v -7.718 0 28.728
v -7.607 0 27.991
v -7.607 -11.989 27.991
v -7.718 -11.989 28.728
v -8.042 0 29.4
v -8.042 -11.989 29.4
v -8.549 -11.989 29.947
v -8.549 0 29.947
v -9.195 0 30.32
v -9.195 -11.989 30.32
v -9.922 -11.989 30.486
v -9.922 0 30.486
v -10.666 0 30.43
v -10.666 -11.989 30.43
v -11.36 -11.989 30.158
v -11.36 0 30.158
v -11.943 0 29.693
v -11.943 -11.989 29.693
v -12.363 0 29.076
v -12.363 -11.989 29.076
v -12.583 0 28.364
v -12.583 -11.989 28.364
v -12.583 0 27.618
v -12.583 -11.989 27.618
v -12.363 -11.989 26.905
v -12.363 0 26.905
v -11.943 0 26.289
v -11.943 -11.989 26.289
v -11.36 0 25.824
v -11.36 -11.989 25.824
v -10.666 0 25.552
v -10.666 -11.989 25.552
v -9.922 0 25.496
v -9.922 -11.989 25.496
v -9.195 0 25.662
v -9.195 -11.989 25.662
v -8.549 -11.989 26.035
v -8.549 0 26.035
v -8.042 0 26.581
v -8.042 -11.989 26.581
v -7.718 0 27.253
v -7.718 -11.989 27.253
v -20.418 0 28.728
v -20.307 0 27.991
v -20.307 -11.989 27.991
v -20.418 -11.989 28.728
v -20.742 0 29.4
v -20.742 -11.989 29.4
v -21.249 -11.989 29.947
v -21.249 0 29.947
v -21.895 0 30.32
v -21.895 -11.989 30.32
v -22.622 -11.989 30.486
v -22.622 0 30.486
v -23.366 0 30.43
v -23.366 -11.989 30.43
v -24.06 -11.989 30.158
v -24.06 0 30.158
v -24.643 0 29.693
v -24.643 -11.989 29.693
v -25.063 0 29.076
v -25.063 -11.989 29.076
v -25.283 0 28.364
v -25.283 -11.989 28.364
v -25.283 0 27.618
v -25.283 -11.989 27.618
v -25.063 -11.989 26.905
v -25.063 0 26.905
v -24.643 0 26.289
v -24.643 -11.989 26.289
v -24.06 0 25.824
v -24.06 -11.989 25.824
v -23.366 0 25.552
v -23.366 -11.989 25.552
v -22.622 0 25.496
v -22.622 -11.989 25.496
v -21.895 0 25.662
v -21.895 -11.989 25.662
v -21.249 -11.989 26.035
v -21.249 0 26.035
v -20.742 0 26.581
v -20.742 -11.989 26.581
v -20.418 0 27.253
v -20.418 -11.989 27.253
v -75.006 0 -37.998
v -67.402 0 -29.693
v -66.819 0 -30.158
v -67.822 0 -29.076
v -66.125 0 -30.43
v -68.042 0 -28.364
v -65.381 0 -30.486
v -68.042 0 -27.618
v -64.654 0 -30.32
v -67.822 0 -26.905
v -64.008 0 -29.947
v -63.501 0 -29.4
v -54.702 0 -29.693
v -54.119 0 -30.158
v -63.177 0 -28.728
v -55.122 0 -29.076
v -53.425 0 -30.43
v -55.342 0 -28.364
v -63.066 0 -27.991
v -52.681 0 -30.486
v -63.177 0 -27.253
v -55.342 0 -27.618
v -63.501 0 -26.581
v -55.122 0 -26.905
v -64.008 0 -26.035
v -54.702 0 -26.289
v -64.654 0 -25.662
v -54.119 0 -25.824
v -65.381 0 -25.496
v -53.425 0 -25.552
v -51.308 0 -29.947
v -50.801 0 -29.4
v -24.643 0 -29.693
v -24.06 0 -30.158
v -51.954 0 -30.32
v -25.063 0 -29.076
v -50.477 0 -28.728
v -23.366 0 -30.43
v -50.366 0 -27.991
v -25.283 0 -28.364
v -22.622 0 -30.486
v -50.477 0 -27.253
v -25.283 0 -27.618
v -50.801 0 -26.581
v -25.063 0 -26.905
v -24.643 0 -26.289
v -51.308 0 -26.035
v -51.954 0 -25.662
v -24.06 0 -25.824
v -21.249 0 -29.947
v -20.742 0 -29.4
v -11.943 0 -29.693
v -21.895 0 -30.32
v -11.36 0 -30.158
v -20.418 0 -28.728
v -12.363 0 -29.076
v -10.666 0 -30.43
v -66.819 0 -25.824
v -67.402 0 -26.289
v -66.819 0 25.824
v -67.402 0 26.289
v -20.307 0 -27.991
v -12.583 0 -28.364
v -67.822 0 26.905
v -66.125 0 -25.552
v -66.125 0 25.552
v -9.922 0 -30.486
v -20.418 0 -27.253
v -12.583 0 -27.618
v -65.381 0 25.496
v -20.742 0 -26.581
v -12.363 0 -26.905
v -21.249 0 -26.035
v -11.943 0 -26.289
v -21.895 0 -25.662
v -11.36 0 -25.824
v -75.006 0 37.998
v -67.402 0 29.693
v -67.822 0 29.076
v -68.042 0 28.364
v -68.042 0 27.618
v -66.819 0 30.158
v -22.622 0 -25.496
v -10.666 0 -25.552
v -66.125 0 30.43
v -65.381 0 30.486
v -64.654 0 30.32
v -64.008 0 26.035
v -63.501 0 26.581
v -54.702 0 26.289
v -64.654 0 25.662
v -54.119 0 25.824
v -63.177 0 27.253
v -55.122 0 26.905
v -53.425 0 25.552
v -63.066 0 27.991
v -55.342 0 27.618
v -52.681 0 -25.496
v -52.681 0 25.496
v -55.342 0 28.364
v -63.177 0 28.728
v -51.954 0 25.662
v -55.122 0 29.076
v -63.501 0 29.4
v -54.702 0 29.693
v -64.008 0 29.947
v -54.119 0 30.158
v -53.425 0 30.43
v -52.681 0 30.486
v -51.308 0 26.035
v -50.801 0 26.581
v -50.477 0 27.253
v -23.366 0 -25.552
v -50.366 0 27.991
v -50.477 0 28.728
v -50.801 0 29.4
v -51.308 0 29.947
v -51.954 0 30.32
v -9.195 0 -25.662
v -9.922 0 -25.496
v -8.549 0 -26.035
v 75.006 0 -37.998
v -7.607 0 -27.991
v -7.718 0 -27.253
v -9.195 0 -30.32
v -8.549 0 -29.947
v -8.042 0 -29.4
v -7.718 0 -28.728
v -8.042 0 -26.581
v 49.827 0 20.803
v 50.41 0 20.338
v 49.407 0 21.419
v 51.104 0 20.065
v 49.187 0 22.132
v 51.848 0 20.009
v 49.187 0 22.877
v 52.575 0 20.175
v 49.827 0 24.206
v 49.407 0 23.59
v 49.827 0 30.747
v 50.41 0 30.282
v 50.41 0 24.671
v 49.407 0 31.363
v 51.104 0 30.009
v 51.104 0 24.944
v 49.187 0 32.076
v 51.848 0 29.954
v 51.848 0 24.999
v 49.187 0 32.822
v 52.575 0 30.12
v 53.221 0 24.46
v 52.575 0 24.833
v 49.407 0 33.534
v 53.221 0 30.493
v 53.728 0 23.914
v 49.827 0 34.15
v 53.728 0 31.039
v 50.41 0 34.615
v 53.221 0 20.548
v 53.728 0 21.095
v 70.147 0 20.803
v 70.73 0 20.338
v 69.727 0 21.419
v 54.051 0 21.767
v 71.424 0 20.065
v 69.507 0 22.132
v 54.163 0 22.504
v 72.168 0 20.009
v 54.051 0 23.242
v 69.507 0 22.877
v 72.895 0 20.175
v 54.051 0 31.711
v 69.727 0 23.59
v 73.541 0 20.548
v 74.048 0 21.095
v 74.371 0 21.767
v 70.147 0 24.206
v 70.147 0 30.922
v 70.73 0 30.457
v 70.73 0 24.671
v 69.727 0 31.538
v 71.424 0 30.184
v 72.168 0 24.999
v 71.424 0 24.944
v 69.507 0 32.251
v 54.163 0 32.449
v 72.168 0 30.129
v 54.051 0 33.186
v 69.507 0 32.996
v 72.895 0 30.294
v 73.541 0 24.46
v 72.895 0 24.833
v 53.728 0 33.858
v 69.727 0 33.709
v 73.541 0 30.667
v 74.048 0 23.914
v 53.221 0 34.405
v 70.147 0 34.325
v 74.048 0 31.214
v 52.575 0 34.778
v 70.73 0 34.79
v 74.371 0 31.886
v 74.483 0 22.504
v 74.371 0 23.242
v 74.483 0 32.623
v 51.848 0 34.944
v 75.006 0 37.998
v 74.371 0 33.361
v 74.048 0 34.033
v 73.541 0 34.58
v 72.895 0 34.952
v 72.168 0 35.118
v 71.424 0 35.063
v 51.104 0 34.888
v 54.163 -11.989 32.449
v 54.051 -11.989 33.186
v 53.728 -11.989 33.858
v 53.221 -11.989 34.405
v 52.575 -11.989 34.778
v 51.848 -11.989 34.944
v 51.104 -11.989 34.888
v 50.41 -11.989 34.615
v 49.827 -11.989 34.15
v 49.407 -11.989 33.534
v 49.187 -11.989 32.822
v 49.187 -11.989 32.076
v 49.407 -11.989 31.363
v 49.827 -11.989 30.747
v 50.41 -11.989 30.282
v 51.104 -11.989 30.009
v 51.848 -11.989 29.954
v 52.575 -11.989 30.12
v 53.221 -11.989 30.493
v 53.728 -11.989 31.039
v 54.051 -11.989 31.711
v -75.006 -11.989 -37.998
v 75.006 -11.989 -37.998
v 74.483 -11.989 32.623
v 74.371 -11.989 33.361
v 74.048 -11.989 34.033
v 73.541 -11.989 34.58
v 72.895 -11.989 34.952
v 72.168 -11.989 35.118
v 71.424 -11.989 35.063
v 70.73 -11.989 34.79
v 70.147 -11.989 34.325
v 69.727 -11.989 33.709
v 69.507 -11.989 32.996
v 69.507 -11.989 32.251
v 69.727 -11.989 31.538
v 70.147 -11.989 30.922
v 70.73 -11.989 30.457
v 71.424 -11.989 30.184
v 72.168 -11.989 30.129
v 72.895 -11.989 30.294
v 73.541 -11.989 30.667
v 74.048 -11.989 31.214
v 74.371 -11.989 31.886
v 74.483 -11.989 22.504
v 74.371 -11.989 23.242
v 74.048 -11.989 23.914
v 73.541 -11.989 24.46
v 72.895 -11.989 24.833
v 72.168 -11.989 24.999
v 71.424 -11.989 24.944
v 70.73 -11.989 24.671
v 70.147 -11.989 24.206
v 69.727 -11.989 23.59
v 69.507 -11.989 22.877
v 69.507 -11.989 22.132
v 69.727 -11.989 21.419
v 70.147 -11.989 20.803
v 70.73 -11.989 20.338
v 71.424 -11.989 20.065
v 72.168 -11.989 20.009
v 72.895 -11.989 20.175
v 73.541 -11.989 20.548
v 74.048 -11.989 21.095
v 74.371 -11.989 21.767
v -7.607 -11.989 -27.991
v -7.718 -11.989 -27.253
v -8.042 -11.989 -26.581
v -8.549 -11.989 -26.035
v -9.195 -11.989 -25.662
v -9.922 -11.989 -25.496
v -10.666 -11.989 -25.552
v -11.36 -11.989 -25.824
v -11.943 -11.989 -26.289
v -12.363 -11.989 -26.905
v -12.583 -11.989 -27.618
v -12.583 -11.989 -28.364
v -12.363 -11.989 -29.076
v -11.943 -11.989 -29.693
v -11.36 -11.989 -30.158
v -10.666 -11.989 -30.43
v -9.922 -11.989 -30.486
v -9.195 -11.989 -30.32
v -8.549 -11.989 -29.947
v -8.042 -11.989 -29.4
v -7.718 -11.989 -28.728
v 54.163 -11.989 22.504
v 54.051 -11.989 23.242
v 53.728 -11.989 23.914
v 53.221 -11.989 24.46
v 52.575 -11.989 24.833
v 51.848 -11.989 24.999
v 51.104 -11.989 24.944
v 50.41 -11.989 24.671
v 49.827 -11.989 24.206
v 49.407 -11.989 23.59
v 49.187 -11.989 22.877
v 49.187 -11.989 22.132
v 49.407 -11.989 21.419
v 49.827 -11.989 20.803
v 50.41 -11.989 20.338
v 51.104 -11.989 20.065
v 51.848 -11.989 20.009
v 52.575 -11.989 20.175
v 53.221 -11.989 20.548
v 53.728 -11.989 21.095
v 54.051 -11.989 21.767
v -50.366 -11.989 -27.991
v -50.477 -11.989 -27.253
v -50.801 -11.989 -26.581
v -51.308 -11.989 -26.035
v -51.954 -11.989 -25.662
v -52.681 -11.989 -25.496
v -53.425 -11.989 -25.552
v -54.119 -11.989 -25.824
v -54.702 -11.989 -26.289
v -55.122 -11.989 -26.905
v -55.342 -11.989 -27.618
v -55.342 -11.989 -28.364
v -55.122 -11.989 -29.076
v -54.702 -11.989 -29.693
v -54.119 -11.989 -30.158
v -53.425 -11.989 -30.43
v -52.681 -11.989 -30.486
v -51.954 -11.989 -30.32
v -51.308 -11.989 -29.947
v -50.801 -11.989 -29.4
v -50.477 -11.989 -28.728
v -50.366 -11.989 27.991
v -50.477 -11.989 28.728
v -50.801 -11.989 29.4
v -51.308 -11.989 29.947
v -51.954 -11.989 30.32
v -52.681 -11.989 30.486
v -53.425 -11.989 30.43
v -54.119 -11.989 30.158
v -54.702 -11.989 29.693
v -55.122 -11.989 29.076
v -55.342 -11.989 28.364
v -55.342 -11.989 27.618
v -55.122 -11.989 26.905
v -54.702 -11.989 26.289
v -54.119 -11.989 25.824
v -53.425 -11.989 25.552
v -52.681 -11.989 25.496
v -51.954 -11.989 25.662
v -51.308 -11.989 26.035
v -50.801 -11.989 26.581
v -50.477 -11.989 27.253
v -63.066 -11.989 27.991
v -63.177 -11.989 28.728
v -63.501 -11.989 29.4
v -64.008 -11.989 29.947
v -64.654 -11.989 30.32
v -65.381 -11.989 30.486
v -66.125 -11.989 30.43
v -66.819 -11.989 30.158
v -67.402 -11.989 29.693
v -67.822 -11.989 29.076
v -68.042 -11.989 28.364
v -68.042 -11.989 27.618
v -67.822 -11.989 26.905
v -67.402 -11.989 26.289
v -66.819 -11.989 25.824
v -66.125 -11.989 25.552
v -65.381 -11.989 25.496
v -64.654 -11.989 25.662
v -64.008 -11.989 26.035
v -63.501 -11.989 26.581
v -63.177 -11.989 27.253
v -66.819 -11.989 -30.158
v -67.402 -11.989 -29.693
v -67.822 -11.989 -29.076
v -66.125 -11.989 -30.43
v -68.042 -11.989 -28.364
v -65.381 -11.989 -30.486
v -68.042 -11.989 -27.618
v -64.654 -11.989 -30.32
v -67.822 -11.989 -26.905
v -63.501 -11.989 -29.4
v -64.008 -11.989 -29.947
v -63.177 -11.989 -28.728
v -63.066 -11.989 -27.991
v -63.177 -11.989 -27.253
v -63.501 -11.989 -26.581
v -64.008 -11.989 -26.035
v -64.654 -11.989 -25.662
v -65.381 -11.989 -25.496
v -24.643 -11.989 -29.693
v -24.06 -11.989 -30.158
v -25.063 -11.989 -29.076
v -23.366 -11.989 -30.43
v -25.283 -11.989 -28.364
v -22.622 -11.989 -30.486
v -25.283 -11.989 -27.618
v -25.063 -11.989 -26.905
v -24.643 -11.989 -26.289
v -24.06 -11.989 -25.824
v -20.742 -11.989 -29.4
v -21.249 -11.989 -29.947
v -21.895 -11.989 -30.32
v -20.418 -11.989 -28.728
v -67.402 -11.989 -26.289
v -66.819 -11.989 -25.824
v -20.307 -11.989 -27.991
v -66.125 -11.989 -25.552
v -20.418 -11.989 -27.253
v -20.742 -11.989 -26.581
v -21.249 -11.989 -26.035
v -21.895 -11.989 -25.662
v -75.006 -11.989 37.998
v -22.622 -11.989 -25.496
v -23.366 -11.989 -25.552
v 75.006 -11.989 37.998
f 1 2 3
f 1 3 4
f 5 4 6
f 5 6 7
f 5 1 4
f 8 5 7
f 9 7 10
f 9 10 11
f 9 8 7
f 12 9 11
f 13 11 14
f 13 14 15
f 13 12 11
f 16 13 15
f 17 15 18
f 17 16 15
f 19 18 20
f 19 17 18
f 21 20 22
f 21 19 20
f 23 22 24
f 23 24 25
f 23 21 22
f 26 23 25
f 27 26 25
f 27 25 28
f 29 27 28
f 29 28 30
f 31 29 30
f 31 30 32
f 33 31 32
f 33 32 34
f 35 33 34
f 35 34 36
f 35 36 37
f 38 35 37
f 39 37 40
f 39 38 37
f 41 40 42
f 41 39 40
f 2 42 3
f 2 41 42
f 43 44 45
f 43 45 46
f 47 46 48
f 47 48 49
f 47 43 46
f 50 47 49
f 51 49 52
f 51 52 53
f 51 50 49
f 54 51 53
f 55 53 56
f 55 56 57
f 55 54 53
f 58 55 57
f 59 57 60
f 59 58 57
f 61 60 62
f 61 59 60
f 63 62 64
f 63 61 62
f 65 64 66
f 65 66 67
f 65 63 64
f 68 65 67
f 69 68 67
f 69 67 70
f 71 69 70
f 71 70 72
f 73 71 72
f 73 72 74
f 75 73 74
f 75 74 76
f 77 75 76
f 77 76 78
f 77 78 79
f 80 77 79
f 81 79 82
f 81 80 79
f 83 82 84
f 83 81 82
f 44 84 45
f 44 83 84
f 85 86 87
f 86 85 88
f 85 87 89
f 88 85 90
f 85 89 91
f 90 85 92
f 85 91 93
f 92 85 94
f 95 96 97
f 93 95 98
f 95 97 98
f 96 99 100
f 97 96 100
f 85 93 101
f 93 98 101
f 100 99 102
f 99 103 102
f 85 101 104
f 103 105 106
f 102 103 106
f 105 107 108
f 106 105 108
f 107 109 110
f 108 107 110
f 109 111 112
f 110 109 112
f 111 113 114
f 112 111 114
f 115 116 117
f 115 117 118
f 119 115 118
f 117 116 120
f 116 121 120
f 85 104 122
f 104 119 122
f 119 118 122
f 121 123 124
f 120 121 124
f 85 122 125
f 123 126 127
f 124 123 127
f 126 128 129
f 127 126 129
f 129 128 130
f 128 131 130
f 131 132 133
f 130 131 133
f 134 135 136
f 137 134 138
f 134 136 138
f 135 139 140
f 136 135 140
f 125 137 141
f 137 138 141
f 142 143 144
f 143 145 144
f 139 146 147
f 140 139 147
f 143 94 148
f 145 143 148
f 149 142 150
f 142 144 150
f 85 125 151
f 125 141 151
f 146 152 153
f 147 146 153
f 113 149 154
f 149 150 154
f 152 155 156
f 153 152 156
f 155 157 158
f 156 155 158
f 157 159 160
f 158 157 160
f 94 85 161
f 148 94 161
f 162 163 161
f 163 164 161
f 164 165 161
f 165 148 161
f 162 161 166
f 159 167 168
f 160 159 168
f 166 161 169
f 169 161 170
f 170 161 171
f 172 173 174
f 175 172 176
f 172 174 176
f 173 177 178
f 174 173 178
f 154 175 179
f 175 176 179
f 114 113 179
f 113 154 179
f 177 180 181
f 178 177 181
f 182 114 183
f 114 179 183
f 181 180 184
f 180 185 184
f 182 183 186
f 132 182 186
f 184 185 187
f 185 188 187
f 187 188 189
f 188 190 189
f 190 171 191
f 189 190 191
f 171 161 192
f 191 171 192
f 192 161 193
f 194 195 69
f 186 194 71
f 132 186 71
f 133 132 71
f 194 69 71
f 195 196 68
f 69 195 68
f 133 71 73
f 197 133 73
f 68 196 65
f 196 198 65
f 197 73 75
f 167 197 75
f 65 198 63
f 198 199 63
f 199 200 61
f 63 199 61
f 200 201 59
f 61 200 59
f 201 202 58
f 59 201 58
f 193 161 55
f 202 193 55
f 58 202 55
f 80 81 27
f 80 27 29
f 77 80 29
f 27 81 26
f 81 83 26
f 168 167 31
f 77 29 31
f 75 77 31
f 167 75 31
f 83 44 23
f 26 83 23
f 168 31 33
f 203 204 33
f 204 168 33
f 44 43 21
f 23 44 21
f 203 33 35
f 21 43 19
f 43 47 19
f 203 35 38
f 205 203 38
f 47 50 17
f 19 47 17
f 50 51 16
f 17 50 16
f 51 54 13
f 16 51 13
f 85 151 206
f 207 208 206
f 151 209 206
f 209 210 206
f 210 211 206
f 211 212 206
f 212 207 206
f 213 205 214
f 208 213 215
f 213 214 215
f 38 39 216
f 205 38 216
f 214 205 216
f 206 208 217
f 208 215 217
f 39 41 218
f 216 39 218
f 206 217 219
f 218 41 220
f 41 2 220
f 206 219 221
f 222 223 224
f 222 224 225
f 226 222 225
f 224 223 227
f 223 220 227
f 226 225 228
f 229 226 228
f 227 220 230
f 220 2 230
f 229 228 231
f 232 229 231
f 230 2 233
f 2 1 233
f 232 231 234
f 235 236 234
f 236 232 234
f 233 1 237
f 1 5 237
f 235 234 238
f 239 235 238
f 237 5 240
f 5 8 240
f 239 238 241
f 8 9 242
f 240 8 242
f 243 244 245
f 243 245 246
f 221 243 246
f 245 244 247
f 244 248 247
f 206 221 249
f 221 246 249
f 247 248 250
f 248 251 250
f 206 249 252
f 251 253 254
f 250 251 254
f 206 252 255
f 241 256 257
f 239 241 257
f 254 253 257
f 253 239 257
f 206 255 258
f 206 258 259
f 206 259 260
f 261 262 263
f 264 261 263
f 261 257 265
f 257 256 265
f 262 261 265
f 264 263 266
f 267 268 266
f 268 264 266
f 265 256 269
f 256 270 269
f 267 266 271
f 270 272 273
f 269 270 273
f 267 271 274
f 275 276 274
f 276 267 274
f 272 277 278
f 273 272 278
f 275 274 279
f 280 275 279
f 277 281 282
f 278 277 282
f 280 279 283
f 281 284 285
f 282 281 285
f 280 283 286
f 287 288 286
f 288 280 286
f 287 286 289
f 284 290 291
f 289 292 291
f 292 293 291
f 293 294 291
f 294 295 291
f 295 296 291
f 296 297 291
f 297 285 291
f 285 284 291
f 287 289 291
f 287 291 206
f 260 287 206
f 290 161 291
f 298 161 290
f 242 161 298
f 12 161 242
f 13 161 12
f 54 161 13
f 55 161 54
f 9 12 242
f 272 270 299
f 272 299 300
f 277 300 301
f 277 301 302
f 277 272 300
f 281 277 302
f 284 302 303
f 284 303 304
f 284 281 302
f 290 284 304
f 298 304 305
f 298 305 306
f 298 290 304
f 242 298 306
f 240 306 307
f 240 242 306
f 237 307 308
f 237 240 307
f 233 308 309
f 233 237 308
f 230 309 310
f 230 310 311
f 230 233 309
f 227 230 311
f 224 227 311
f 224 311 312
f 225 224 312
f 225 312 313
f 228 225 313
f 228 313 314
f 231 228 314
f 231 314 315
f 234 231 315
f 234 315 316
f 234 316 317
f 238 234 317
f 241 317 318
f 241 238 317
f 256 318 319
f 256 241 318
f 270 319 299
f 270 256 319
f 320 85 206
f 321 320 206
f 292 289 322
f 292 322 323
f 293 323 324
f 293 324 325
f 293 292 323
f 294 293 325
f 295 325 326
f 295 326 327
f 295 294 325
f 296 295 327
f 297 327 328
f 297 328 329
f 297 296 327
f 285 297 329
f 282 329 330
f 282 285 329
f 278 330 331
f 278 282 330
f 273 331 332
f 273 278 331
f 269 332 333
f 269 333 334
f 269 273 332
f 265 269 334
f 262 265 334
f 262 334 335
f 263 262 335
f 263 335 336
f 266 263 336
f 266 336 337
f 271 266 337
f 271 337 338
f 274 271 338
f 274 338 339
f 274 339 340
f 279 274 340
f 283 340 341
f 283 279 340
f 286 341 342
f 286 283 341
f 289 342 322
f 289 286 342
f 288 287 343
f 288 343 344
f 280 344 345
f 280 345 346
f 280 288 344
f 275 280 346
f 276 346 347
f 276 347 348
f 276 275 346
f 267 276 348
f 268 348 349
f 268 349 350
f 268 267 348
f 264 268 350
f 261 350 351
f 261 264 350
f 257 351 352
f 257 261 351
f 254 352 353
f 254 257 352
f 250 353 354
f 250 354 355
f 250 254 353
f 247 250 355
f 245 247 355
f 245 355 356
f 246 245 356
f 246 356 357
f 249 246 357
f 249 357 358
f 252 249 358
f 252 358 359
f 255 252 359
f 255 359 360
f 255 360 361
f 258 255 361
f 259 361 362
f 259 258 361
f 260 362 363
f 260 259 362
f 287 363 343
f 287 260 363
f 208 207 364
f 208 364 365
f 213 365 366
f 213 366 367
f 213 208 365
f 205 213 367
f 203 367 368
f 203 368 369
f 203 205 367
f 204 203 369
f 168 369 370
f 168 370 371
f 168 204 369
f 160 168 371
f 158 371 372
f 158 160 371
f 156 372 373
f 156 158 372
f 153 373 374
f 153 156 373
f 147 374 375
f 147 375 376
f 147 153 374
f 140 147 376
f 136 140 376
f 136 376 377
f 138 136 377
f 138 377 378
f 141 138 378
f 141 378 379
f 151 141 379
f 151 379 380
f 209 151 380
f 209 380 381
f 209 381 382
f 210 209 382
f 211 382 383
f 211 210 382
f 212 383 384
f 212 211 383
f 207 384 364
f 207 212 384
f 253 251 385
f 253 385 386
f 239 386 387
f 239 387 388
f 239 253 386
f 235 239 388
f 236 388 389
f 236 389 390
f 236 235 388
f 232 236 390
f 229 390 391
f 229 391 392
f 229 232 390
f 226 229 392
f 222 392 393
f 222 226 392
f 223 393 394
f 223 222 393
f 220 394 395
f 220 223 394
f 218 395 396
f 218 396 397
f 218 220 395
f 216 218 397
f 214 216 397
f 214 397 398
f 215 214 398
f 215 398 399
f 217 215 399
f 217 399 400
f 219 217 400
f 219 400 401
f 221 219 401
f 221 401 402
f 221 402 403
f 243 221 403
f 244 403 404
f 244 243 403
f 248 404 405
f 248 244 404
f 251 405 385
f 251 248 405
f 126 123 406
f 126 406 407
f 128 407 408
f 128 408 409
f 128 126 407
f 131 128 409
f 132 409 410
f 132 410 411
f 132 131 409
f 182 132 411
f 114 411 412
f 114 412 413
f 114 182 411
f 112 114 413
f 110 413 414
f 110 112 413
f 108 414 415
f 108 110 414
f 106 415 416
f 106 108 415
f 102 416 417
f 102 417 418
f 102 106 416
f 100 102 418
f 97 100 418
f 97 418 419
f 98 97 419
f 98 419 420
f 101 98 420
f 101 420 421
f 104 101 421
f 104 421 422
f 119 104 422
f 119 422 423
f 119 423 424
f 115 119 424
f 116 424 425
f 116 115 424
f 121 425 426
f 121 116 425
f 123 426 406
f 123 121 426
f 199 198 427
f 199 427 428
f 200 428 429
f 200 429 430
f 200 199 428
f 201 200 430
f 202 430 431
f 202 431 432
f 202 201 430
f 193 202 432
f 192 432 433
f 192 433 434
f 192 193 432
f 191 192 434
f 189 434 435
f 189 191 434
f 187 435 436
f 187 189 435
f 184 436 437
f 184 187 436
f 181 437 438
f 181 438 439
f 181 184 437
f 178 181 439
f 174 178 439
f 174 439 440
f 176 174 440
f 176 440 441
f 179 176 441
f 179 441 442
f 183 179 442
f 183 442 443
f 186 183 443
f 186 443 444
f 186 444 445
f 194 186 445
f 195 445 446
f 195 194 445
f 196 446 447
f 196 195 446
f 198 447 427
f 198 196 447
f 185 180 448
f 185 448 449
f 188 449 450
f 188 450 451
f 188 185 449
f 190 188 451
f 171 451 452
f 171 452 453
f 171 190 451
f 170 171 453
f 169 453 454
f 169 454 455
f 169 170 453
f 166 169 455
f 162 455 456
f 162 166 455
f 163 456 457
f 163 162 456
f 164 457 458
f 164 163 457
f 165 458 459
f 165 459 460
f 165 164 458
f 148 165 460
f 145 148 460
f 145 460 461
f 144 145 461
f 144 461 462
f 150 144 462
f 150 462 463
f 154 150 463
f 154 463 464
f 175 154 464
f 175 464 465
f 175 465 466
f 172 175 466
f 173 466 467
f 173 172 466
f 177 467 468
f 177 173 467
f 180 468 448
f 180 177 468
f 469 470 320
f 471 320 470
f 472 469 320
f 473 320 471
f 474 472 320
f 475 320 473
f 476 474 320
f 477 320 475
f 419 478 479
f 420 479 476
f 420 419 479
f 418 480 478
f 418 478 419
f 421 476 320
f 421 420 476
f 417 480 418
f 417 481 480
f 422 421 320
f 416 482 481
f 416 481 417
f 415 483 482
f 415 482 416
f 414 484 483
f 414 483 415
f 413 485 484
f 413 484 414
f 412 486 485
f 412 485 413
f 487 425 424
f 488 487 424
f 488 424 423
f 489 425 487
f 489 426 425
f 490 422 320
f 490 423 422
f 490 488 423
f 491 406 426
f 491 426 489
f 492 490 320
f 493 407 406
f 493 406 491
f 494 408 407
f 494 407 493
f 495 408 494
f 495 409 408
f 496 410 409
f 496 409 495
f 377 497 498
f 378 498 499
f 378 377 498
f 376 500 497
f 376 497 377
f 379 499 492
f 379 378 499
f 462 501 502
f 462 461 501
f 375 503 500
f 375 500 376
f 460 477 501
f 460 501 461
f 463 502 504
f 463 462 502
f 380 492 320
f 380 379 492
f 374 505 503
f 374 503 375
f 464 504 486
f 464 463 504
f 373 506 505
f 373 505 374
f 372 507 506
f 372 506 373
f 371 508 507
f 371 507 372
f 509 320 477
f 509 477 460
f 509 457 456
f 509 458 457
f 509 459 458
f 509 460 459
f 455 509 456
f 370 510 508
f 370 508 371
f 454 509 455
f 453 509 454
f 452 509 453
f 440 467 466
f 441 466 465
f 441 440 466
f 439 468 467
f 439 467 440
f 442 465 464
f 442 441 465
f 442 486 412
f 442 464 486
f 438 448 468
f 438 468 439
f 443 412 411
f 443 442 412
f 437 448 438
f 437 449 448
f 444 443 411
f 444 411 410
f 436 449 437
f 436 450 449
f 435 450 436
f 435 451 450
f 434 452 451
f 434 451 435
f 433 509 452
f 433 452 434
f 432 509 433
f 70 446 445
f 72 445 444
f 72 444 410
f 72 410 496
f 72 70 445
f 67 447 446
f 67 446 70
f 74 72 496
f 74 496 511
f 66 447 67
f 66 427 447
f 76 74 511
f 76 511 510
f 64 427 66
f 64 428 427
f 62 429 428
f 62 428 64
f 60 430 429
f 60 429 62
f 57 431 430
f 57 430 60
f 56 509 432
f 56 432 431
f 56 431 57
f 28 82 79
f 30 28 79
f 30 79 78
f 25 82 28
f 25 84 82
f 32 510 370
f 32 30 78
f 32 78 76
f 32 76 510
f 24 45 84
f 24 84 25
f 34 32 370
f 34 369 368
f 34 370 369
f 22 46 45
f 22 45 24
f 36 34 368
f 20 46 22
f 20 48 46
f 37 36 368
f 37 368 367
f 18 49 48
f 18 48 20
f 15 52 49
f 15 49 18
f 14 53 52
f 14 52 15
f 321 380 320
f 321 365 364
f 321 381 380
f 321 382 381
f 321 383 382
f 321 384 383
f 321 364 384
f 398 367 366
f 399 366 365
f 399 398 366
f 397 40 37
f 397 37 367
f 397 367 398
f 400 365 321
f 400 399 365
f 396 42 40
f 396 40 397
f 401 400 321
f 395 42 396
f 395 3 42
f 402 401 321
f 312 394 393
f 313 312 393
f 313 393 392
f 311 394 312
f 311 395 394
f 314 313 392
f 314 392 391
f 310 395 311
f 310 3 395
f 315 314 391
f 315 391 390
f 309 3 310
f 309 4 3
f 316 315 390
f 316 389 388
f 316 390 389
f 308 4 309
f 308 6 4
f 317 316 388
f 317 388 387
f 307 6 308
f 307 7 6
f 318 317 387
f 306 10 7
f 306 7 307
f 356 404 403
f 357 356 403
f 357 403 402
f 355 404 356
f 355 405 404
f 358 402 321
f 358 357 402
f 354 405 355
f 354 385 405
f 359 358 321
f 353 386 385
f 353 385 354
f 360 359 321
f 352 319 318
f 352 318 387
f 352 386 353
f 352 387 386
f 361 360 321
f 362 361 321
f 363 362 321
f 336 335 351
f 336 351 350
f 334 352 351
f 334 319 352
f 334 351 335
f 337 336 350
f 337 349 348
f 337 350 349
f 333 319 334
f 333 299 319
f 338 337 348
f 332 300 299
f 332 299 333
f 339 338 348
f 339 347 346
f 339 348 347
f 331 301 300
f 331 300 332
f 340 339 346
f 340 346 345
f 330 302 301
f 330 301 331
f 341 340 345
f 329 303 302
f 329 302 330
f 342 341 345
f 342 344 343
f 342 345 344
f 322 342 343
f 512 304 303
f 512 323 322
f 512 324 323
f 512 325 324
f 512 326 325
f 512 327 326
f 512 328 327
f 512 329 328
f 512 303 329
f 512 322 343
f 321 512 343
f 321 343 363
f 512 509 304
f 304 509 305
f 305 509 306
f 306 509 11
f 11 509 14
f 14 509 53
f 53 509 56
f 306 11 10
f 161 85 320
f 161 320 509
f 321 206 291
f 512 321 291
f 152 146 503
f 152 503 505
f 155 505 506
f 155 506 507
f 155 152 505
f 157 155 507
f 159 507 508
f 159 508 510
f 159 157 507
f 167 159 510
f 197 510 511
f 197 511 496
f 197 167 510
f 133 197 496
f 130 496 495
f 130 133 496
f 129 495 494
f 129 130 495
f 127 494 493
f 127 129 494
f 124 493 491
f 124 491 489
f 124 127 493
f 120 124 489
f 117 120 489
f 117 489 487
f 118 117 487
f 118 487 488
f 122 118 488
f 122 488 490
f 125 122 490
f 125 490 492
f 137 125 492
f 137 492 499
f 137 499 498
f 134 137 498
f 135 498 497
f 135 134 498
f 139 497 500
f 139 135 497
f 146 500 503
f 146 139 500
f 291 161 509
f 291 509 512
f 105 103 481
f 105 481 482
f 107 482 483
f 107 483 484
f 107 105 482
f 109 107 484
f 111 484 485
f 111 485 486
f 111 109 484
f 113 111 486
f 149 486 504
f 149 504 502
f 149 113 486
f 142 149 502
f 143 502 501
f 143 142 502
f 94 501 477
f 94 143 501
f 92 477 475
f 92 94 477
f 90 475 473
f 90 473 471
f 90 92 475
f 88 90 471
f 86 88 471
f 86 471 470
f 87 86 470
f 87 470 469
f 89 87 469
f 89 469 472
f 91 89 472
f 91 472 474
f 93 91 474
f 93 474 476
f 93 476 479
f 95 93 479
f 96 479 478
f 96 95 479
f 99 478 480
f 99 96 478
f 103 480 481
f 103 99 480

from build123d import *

# Parameters (mm, degrees)
F0_W     = 150.0124
F0_H     = 75.9968
F0_R     = 2.5019
F1_DEPTH = 11.9888


with BuildPart() as f1:
    # F0 (on Front) → F1 (new body)
    with BuildSketch(Plane.XZ):
        Rectangle(F0_W, F0_H)
        with Locations((-65.567933, -27.9908)):
            Circle(F0_R, mode=Mode.SUBTRACT)
        with Locations((-52.867933, -27.9908)):
            Circle(F0_R, mode=Mode.SUBTRACT)
        with Locations((-22.808934, -27.9908)):
            Circle(F0_R, mode=Mode.SUBTRACT)
        with Locations((-10.108934, -27.9908)):
            Circle(F0_R, mode=Mode.SUBTRACT)
        with Locations((-65.567933, 27.9908)):
            Circle(F0_R, mode=Mode.SUBTRACT)
        with Locations((-52.867933, 27.9908)):
            Circle(F0_R, mode=Mode.SUBTRACT)
        with Locations((-22.808934, 27.9908)):
            Circle(F0_R, mode=Mode.SUBTRACT)
        with Locations((-10.108934, 27.9908)):
            Circle(F0_R, mode=Mode.SUBTRACT)
        with Locations((51.660687, 22.5044)):
            Circle(F0_R, mode=Mode.SUBTRACT)
        with Locations((71.980687, 22.5044)):
            Circle(F0_R, mode=Mode.SUBTRACT)
        with Locations((51.660687, 32.448623)):
            Circle(F0_R, mode=Mode.SUBTRACT)
        with Locations((71.980687, 32.623451)):
            Circle(F0_R, mode=Mode.SUBTRACT)
    extrude(amount=F1_DEPTH)


solid = f1.part
